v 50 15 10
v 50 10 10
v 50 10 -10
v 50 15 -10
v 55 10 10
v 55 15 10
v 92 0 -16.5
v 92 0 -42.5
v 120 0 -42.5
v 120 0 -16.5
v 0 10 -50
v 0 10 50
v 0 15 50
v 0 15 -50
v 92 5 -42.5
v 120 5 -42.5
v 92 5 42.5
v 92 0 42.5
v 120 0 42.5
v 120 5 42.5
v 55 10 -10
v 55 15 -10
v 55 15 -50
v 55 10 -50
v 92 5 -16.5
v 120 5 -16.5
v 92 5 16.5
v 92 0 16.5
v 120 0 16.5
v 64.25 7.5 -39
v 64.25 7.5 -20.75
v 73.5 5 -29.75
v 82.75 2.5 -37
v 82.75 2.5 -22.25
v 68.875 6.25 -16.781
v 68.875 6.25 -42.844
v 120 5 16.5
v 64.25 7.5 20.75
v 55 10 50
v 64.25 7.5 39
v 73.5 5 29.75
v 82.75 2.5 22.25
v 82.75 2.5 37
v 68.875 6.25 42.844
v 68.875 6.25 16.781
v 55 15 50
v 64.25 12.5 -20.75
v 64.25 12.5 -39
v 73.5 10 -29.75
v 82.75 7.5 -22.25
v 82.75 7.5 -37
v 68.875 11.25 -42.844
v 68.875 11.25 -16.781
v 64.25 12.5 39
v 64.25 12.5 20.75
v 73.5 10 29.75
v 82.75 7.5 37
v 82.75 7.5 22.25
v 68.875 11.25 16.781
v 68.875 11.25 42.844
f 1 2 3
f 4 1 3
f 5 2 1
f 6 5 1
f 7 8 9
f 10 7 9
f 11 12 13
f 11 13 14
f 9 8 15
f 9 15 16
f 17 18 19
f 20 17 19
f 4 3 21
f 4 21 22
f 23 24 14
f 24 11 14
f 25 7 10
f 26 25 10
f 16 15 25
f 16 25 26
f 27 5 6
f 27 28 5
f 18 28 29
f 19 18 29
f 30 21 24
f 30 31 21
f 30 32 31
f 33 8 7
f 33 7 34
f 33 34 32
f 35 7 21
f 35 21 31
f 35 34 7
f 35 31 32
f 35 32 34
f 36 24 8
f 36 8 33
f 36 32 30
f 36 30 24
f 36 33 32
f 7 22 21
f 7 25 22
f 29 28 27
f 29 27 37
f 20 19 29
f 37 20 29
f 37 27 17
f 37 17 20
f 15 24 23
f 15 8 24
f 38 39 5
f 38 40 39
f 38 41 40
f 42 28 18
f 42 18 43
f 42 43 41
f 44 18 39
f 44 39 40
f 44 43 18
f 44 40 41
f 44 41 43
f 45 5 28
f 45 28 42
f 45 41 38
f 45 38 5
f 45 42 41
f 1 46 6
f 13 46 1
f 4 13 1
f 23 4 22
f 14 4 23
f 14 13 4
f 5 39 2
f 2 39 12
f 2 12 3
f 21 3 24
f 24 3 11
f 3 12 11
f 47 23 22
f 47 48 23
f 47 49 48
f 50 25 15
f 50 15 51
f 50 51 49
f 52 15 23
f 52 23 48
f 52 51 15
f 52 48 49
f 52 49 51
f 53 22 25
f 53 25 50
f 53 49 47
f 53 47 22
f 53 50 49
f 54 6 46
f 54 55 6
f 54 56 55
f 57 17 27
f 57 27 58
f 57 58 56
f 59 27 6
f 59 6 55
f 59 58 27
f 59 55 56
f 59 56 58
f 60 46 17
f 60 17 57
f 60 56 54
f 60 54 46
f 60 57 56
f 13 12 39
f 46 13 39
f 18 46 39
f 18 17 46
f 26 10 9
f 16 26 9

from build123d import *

# Parameters (mm, degrees)
SKETCH_1_W        = 28
SKETCH_1_H        = 26
EXTRUDE_1_DEPTH   = 5
EXTRUDE_1_2_DEPTH = 5
EXTRUDE_START     = 10
SKETCH_1_12_W     = 50
SKETCH_1_12_H     = 100
EXTRUDE_2_DEPTH   = 5
SKETCH_2_W        = 40
SKETCH_2_H        = 5
EXTRUDE_3_DEPTH   = 5


with BuildPart() as part:
    # 草图1 → 凸台-拉伸1 (new body)
    with BuildSketch(Plane(origin=(0, 0, 0), x_dir=(1, 0, 0), z_dir=(0, 1, 0))):
        with Locations((106, 29.5)):
            Rectangle(SKETCH_1_W, SKETCH_1_H)
    extrude(amount=EXTRUDE_1_DEPTH)


with BuildPart() as body_2:
    # 草图1 → Extrude 1 2 (new body)
    with BuildSketch(Plane(origin=(0, 0, 0), x_dir=(1, 0, 0), z_dir=(0, 1, 0))):
        with Locations((106, -29.5)):
            Rectangle(SKETCH_1_W, SKETCH_1_H)
    extrude(amount=EXTRUDE_1_2_DEPTH)


with BuildPart() as body_3:
    # 草图1<12> → 凸台-拉伸2 (new body)
    with BuildSketch(Plane(origin=(0, 0, 0), x_dir=(1, 0, 0), z_dir=(0, 1, 0)).offset(EXTRUDE_START)):
        with Locations((25, 0)):
            Rectangle(SKETCH_1_12_W, SKETCH_1_12_H)
    extrude(amount=EXTRUDE_2_DEPTH)

    # 草图2 → 凸台-拉伸3 (add)
    with BuildSketch(Plane(origin=(50, 0, 0), x_dir=(0, 0, -1), z_dir=(1, 0, 0))):
        with Locations((30, 12.5)):
            Rectangle(SKETCH_2_W, SKETCH_2_H)
        with Locations((-30, 12.5)):
            Rectangle(SKETCH_2_W, SKETCH_2_H)
    extrude(amount=EXTRUDE_3_DEPTH)


    add(body_2.part)  # loft_5 joins it to this body
    # loft from a face of the part (loft_5)
    loft([body_3.faces().sort_by_distance((55, 12.5, 30))[0], body_3.faces().sort_by_distance((92, 2.5, 29.5))[0]])


    add(part.part)  # loft_6 joins it to this body
    # loft from a face of the part (loft_6)
    loft([body_3.faces().sort_by_distance((55, 12.5, -30))[0], body_3.faces().sort_by_distance((92, 2.5, -29.5))[0]])


solid = body_3.part
